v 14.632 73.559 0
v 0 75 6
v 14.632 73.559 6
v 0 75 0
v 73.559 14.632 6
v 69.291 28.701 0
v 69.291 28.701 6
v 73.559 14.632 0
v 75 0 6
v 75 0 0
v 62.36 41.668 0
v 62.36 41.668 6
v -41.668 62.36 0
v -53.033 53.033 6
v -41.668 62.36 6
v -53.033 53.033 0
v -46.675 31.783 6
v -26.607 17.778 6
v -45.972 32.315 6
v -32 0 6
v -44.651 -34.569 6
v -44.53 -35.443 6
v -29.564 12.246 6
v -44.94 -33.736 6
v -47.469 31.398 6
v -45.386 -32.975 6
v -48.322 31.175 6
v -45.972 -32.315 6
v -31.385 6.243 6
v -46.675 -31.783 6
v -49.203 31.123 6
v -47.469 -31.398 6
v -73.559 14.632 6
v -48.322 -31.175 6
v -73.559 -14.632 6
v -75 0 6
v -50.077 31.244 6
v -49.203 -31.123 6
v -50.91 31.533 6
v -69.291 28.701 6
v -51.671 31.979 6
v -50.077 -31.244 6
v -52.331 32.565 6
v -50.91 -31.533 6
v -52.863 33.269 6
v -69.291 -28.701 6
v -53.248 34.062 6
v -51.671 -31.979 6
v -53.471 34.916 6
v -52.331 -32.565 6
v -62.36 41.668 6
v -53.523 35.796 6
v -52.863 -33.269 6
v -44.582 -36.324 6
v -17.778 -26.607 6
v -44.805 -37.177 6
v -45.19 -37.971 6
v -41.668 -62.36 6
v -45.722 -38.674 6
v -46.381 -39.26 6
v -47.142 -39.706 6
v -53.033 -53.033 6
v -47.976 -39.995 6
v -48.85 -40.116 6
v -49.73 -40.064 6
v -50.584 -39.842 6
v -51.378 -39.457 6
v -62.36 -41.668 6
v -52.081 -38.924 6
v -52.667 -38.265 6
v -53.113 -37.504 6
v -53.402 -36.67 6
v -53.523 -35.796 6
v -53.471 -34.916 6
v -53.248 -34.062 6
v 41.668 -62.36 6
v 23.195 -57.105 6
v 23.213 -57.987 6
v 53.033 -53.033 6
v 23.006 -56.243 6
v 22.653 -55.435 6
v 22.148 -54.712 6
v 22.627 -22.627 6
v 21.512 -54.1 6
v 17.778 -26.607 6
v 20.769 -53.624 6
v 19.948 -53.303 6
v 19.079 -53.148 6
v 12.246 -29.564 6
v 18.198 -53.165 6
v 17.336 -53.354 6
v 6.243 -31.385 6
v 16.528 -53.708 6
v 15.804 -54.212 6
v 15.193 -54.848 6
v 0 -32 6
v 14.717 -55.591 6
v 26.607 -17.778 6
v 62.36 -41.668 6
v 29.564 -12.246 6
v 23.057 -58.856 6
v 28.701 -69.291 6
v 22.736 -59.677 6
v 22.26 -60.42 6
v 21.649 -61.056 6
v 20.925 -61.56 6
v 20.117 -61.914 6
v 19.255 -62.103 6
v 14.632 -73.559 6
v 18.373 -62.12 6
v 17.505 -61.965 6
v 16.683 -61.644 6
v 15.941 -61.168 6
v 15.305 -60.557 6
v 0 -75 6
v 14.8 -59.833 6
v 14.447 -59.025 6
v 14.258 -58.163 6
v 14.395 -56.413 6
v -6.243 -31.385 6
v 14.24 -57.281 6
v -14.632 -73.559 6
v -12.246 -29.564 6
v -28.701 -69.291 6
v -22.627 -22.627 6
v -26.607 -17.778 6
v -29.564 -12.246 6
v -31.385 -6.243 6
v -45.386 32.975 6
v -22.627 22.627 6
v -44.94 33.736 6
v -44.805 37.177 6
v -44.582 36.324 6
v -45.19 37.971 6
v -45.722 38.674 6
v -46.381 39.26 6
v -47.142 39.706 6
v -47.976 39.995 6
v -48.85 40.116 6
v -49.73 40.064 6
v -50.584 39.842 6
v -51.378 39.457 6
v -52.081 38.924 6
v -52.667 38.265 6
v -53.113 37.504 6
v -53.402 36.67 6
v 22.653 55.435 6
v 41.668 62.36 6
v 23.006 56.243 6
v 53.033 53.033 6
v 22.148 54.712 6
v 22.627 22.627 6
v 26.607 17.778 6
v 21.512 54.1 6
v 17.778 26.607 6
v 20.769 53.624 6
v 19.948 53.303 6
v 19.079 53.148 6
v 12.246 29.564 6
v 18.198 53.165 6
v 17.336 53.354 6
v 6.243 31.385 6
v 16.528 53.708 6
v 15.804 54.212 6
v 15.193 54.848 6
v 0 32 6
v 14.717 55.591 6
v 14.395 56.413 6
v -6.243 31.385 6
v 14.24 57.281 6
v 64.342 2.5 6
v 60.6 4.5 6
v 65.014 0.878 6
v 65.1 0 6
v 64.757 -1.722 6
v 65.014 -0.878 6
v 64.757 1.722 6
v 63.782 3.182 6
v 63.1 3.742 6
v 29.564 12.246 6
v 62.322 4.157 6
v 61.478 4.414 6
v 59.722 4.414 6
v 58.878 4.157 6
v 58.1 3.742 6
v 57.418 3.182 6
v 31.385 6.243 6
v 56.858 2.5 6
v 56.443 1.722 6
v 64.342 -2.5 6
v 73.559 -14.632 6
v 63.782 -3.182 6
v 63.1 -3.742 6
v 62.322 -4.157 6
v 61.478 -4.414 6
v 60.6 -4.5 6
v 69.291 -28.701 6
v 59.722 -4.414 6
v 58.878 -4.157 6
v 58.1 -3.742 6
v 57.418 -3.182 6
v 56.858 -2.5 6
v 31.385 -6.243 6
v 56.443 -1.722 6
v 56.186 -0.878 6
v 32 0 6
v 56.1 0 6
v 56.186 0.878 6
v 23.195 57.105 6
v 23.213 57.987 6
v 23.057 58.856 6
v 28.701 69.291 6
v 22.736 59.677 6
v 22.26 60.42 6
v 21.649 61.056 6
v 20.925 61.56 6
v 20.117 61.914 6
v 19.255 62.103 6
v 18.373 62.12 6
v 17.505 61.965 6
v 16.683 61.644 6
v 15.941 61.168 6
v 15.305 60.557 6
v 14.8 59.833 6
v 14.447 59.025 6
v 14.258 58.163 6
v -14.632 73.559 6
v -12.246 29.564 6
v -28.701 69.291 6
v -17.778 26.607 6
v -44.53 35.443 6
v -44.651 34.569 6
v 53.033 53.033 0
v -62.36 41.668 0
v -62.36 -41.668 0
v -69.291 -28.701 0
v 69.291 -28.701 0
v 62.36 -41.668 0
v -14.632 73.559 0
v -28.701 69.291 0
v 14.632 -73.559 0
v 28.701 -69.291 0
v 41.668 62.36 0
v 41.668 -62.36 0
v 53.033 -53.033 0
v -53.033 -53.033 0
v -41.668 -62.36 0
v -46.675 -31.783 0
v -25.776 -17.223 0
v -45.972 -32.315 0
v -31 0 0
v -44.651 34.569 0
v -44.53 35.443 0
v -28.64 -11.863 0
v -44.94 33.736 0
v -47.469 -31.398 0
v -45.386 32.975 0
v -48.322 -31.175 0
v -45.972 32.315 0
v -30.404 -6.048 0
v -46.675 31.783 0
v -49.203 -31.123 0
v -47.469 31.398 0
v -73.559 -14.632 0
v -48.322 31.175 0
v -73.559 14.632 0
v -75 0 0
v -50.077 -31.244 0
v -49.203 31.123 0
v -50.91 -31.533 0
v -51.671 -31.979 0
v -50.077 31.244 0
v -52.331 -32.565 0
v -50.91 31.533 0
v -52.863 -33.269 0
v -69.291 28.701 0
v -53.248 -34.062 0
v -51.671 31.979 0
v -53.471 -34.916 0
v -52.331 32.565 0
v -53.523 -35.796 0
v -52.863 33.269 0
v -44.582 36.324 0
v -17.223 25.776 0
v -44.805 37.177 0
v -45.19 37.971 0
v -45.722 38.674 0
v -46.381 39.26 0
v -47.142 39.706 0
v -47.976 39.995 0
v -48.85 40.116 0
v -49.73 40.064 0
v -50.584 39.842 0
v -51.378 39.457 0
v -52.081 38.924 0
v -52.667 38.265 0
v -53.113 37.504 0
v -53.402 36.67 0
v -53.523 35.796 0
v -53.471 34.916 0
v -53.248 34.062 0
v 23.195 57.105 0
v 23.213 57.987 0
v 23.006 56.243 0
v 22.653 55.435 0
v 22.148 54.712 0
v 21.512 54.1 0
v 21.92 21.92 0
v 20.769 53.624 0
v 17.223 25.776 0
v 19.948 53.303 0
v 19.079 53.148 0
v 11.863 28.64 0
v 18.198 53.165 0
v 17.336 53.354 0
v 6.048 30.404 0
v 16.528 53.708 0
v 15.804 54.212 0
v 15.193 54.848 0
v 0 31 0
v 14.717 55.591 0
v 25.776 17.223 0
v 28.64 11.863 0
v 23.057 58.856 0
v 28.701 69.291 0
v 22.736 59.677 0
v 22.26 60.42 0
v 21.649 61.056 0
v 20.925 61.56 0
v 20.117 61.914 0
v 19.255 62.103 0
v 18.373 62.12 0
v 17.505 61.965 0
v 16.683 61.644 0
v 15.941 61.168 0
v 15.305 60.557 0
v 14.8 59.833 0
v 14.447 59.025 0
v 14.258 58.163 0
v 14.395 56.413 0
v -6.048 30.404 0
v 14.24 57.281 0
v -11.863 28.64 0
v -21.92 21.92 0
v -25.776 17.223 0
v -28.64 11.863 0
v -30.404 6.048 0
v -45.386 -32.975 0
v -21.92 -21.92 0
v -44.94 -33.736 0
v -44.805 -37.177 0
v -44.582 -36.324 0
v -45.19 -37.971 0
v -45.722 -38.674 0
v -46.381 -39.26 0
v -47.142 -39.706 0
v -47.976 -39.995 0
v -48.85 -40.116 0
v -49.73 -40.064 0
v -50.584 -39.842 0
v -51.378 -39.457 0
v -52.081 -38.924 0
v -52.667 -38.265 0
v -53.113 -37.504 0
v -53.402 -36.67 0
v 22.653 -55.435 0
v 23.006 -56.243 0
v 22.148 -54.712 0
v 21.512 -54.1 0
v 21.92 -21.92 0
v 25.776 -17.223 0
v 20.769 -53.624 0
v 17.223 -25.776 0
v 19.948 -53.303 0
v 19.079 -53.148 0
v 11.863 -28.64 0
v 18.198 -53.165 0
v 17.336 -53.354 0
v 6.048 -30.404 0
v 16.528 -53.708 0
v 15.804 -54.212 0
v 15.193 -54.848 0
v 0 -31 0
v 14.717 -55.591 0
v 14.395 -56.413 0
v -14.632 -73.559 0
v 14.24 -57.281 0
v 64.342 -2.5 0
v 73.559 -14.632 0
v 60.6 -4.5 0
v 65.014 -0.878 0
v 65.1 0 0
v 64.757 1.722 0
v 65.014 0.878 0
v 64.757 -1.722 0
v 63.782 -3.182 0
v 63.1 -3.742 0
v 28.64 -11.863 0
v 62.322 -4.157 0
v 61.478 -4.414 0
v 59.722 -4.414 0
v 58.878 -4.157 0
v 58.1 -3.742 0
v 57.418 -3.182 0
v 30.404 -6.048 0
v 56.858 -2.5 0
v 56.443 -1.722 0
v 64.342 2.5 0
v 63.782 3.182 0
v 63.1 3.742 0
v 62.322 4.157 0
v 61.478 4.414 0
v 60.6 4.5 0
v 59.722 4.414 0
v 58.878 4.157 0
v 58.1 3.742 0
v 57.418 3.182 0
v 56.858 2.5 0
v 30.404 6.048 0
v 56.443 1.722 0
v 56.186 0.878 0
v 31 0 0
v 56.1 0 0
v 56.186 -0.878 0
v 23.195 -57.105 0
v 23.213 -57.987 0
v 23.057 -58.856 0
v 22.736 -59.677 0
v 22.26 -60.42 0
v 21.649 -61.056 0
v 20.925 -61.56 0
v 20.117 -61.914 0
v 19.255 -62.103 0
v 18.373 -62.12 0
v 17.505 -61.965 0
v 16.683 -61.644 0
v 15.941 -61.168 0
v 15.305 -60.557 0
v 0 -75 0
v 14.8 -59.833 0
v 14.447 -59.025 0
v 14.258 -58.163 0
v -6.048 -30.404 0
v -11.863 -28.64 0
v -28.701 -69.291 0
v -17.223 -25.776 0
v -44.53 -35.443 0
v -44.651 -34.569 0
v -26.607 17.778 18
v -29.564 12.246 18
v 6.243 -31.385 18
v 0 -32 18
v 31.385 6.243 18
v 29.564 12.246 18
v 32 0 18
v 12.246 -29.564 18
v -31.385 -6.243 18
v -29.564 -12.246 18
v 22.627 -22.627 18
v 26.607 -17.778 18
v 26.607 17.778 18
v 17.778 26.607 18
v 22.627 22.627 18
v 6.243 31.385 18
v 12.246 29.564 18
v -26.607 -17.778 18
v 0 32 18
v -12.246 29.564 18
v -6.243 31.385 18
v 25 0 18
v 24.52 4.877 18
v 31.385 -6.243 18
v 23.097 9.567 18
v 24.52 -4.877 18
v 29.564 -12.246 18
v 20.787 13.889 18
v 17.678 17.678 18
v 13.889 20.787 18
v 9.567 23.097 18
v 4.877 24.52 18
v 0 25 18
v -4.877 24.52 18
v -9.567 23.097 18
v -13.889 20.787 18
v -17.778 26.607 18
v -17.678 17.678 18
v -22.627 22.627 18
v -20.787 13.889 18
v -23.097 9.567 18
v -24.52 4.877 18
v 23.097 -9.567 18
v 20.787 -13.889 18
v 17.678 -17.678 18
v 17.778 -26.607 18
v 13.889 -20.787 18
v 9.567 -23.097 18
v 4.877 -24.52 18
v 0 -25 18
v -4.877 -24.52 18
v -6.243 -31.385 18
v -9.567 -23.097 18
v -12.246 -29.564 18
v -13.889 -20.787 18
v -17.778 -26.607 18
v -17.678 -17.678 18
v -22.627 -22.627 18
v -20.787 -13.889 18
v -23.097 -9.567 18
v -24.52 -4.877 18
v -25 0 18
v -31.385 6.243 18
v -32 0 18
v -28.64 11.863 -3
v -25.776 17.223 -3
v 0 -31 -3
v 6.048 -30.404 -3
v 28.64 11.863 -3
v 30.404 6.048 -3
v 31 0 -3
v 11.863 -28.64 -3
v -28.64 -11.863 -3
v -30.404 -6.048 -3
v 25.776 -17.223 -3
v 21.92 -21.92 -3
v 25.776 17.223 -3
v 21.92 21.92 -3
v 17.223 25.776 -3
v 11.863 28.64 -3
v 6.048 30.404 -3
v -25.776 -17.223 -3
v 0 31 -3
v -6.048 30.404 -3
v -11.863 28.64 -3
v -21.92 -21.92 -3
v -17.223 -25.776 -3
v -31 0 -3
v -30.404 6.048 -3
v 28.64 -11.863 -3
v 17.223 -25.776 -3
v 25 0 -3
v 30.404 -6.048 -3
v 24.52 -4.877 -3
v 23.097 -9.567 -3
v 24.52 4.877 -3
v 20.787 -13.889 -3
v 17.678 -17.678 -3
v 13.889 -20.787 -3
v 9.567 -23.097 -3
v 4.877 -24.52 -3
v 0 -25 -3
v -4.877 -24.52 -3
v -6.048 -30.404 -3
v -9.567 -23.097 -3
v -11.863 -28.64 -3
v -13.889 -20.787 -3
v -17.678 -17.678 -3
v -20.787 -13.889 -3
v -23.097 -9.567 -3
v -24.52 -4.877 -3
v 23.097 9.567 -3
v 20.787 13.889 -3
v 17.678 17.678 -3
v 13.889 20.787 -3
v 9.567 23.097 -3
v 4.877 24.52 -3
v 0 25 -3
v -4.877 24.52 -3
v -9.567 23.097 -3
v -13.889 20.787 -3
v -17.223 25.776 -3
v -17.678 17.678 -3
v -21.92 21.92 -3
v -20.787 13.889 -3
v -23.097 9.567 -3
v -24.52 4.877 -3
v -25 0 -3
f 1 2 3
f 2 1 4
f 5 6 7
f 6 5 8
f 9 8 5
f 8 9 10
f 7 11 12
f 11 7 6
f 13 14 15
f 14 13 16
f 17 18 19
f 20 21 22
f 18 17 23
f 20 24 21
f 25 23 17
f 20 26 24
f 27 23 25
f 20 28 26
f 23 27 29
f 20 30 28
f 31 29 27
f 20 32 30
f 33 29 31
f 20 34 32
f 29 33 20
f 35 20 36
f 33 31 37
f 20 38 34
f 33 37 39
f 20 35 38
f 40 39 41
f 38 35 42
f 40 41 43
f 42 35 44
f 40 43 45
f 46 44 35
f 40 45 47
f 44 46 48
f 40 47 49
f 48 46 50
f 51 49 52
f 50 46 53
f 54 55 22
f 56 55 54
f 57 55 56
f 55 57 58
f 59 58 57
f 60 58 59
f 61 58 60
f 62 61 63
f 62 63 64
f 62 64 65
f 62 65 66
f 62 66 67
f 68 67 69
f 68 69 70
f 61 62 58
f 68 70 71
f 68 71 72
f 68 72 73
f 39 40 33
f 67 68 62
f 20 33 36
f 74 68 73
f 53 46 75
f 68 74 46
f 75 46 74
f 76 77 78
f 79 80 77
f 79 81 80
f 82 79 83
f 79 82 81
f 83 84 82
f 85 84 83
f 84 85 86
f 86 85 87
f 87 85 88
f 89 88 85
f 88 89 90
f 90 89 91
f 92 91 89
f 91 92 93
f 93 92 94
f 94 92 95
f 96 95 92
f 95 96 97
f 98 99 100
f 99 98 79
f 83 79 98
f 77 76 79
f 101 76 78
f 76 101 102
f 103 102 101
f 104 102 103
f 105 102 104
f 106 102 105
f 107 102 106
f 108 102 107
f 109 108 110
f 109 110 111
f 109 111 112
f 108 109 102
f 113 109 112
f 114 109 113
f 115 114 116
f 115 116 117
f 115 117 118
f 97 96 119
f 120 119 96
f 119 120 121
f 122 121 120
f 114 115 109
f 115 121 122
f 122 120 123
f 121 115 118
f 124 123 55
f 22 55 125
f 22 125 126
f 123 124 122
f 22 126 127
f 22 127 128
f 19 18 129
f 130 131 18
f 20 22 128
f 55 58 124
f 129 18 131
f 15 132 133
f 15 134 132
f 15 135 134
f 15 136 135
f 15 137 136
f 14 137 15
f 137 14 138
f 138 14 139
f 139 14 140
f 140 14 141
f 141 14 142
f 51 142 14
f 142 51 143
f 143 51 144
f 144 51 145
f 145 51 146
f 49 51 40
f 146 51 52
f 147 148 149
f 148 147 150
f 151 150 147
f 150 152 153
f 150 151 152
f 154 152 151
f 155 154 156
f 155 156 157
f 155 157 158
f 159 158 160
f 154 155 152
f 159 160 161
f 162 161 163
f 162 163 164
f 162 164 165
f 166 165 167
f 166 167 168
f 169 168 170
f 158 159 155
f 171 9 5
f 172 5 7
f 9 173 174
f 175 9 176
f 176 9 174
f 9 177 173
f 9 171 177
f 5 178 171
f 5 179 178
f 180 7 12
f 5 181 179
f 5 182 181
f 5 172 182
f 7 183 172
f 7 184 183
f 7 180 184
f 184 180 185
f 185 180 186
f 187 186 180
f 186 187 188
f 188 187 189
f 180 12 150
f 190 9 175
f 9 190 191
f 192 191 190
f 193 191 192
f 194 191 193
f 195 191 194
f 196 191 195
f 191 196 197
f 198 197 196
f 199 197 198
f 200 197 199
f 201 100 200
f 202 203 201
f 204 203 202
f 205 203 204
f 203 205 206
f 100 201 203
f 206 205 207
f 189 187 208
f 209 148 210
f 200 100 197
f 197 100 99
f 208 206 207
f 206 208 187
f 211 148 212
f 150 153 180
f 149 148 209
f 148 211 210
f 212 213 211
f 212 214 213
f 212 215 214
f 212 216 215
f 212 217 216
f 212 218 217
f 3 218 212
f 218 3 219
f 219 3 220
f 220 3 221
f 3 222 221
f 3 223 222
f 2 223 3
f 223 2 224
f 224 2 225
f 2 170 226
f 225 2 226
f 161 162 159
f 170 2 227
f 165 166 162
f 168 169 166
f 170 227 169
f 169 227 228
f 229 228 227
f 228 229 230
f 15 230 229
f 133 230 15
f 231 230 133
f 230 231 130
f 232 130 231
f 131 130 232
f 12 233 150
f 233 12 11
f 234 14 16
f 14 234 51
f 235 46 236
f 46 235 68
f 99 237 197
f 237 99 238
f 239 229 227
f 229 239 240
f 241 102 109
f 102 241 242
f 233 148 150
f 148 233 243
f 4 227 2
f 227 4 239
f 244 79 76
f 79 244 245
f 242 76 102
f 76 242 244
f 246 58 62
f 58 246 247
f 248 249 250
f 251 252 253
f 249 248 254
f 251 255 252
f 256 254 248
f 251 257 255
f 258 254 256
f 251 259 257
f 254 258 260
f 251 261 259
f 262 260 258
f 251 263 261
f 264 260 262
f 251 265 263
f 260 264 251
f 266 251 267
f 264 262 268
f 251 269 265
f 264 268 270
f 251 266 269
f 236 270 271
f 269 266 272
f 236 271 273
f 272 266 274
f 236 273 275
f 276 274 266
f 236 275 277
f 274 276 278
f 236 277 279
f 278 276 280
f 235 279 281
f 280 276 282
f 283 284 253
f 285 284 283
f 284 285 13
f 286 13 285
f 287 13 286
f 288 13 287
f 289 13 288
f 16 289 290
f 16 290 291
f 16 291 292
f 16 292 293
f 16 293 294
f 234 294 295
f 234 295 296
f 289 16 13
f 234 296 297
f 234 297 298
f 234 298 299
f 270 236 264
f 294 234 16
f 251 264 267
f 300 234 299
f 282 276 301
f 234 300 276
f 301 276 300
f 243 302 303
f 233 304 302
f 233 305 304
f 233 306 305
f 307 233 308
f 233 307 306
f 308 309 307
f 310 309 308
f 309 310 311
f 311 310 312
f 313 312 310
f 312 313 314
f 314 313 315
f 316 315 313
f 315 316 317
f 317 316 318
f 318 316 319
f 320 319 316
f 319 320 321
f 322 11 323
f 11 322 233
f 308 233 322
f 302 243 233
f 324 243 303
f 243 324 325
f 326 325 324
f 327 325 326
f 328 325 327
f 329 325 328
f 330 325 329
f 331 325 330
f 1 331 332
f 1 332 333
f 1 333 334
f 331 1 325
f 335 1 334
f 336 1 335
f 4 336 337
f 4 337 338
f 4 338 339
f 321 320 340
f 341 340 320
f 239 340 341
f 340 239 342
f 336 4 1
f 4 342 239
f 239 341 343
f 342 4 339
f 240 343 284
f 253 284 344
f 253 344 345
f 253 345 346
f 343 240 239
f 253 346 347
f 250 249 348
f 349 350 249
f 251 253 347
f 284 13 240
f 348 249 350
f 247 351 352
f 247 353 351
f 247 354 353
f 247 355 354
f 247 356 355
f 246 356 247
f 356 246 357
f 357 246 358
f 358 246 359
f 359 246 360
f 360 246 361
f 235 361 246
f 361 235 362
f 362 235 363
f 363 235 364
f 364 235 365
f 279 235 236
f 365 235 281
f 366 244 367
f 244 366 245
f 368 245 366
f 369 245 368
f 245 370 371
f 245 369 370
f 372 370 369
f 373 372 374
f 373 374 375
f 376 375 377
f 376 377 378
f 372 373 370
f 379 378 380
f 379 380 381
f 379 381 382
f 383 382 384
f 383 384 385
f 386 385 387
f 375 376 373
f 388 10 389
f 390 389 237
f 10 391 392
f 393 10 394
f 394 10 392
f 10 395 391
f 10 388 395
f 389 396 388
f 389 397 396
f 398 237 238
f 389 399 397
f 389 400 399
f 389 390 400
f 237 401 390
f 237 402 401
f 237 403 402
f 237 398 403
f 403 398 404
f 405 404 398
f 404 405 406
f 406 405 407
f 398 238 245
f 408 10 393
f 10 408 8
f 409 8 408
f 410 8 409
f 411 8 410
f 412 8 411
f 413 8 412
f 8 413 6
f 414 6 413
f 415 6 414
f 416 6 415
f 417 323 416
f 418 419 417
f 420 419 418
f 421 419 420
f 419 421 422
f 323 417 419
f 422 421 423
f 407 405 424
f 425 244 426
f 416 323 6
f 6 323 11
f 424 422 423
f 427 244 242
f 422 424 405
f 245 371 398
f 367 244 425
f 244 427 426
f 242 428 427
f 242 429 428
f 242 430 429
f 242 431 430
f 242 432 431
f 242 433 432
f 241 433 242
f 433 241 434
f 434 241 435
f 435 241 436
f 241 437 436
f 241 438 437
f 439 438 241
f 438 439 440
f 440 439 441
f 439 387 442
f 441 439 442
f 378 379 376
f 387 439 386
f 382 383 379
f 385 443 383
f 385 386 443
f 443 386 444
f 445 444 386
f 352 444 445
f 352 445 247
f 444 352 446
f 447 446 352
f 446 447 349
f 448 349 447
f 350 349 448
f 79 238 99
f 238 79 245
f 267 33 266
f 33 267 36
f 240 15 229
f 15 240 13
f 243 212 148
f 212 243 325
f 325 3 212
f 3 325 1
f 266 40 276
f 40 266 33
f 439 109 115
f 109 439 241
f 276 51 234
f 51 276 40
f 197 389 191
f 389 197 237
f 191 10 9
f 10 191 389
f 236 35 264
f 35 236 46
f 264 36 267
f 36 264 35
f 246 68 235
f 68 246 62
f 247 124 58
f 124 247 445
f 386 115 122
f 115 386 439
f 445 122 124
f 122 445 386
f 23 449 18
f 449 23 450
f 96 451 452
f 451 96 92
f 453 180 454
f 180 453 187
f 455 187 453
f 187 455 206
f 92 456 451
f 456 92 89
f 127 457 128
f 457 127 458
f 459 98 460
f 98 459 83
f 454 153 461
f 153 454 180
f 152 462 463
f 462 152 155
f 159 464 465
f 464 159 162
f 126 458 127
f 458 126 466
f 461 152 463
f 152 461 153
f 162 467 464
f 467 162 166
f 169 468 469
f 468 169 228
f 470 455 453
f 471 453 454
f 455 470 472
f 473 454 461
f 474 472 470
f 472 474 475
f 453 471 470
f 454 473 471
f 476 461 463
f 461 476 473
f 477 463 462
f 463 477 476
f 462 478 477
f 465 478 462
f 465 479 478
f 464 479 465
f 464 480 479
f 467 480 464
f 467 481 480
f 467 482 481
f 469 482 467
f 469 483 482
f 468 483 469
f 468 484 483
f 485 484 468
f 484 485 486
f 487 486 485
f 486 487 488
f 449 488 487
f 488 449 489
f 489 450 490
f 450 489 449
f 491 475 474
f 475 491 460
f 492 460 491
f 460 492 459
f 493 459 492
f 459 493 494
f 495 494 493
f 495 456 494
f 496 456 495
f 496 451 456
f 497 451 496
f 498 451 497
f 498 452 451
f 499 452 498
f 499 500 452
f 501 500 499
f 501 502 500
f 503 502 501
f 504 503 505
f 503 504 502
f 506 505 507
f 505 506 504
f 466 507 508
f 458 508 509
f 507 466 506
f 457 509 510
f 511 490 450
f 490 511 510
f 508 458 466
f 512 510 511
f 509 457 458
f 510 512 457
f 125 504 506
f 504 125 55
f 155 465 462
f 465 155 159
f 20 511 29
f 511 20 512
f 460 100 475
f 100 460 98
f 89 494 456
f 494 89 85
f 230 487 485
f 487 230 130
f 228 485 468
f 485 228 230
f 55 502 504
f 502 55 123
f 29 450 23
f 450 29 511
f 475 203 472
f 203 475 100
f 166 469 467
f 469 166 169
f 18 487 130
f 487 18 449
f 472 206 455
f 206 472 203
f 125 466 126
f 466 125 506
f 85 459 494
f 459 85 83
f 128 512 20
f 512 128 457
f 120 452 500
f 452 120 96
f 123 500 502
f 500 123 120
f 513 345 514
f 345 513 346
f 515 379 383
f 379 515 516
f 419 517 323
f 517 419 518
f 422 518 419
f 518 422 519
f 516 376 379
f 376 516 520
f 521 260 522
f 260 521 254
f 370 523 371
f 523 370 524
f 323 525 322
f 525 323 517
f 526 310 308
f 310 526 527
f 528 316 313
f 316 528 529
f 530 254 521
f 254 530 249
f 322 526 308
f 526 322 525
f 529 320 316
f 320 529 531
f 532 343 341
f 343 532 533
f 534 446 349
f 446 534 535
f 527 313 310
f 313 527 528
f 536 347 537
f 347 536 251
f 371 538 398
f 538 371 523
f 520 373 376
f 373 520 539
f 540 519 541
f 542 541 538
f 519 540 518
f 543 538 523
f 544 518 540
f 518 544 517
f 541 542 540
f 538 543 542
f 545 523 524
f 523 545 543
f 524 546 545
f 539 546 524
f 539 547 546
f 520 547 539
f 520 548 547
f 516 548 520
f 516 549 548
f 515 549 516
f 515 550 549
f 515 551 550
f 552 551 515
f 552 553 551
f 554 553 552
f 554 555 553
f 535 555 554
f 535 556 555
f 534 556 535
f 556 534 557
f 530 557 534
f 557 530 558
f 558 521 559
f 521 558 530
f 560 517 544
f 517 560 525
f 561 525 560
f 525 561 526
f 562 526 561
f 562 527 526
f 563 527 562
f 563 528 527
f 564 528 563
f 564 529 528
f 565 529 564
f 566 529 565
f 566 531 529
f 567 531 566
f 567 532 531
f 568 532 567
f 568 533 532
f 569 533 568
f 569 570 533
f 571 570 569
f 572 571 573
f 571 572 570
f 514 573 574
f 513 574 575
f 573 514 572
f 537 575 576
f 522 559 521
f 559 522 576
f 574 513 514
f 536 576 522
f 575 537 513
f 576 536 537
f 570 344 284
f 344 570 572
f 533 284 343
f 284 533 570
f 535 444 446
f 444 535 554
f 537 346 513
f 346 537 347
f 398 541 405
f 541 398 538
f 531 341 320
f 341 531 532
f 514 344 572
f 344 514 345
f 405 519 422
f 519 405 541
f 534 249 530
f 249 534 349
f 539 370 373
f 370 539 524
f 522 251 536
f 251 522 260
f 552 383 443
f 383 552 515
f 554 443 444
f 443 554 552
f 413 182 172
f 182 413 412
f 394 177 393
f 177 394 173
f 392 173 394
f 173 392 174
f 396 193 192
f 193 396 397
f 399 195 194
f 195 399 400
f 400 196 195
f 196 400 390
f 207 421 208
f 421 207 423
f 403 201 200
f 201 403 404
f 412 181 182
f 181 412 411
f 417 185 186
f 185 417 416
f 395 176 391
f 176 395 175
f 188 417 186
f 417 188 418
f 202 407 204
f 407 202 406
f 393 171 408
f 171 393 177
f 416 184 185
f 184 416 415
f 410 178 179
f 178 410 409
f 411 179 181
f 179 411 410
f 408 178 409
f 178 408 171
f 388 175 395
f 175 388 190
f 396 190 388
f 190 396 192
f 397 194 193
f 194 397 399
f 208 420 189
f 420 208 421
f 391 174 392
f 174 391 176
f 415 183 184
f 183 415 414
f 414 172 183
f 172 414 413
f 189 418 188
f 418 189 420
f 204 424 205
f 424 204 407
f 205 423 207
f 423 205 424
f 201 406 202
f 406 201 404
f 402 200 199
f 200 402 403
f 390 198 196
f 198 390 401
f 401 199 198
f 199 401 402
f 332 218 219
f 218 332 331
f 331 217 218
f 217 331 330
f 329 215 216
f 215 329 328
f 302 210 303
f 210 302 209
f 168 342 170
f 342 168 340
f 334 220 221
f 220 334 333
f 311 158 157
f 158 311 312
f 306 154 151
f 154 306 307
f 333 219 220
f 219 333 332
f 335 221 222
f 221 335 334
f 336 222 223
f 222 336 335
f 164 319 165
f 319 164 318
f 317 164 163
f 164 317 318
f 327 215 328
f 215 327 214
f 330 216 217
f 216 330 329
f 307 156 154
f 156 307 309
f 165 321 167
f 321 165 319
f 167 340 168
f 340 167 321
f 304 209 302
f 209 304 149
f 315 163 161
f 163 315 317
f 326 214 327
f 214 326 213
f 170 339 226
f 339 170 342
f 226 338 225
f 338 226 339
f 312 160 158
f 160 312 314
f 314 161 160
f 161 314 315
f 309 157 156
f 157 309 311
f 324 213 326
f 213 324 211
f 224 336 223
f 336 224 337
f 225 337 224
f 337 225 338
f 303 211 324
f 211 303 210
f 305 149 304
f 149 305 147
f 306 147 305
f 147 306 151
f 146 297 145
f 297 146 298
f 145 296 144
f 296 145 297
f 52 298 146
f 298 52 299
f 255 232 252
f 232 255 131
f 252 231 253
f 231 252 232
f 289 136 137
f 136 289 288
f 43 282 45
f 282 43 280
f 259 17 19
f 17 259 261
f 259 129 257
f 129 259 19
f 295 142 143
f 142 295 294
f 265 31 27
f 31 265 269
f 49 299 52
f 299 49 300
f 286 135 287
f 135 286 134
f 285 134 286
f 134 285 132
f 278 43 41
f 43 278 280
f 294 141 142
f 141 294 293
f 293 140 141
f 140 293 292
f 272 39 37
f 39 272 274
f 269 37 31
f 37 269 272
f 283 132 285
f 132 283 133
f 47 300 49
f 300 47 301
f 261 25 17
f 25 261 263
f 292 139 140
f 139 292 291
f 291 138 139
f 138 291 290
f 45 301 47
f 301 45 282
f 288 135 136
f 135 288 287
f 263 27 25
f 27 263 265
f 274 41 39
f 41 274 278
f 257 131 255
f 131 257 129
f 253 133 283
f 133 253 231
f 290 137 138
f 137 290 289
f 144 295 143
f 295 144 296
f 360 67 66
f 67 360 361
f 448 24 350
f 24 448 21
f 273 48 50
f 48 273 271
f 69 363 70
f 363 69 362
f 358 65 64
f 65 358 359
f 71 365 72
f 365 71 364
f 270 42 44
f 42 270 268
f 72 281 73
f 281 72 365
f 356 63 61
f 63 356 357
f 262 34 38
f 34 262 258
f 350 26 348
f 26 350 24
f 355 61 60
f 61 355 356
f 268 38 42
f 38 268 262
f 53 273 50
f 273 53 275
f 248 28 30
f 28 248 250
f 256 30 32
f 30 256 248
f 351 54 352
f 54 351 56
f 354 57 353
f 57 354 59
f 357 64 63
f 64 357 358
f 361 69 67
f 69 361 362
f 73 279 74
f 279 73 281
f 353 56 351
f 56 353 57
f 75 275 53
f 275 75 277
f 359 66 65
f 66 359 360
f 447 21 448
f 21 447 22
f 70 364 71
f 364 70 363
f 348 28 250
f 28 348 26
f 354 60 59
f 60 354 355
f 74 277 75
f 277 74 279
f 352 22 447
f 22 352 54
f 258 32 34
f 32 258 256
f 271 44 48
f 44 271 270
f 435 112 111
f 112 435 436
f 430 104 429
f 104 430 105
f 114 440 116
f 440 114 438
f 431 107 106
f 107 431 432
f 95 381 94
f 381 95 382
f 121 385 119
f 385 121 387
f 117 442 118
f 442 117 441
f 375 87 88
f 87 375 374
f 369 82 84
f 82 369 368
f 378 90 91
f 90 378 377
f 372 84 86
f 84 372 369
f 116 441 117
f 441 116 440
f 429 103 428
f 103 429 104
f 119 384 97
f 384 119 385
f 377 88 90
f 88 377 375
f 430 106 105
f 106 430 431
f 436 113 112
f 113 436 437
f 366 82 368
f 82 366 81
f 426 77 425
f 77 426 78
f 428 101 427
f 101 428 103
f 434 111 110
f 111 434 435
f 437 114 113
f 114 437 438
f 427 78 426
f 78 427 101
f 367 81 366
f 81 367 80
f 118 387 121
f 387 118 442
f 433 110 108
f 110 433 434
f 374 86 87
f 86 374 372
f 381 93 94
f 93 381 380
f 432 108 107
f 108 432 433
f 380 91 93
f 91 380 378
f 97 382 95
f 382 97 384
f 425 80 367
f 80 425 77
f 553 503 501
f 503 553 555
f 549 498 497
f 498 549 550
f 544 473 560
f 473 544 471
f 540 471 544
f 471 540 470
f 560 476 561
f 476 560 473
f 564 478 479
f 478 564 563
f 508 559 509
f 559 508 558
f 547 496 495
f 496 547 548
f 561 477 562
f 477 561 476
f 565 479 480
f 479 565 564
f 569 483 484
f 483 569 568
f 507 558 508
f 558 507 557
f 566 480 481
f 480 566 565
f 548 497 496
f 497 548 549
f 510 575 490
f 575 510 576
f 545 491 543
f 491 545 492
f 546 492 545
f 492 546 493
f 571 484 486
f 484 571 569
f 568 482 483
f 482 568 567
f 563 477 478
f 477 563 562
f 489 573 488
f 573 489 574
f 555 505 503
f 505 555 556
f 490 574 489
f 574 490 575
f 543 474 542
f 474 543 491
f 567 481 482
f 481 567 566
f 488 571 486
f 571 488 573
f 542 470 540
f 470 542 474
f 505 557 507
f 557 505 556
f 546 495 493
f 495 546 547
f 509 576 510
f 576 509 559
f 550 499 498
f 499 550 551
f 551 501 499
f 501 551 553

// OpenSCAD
$fn = 32;

// ----------------------------------------------------------------------
// Bolt-circle flange: 150 mm outside, 5 bolt holes, bore 50 mm
// ----------------------------------------------------------------------

// --- parameters (mm) ---
flange_d = 150;           // flange outside diameter
flange_t = 6;             // flange thickness
bolts = 5;                // number of bolt holes
bolt_d = 9;               // bolt clearance
bolt_r = 60.6;            // bolt circle radius
bore_d = 50;              // centre bore
hub_d = 64;               // raised hub diameter
hub_h = 12;               // raised hub height
spigot_d = 62;            // spigot diameter
spigot_h = 4;             // spigot height below the flange
sink = 1;                 // overlap into the flange

module body() {
  cylinder(h = flange_t, d = flange_d);
  /* raised hub, sunk 1 mm into the flange */
  translate([0, 0, flange_t - 1]) cylinder(h = hub_h + 1, d = hub_d);
  /* spigot on the back face, sunk into the flange */
  translate([0, 0, -spigot_h + sink]) cylinder(h = spigot_h, d = spigot_d);
}

difference() {
  body();
  /* bolt circle */
  for (i = [0 : bolts - 1]) rotate([0, 0, i * 360 / bolts]) translate([bolt_r, 0, -spigot_h - 1]) cylinder(h = flange_t + hub_h + spigot_h + 3, d = bolt_d);
  translate([0, 0, -spigot_h - 1]) cylinder(h = flange_t + hub_h + spigot_h + 3, d = bore_d);
}
